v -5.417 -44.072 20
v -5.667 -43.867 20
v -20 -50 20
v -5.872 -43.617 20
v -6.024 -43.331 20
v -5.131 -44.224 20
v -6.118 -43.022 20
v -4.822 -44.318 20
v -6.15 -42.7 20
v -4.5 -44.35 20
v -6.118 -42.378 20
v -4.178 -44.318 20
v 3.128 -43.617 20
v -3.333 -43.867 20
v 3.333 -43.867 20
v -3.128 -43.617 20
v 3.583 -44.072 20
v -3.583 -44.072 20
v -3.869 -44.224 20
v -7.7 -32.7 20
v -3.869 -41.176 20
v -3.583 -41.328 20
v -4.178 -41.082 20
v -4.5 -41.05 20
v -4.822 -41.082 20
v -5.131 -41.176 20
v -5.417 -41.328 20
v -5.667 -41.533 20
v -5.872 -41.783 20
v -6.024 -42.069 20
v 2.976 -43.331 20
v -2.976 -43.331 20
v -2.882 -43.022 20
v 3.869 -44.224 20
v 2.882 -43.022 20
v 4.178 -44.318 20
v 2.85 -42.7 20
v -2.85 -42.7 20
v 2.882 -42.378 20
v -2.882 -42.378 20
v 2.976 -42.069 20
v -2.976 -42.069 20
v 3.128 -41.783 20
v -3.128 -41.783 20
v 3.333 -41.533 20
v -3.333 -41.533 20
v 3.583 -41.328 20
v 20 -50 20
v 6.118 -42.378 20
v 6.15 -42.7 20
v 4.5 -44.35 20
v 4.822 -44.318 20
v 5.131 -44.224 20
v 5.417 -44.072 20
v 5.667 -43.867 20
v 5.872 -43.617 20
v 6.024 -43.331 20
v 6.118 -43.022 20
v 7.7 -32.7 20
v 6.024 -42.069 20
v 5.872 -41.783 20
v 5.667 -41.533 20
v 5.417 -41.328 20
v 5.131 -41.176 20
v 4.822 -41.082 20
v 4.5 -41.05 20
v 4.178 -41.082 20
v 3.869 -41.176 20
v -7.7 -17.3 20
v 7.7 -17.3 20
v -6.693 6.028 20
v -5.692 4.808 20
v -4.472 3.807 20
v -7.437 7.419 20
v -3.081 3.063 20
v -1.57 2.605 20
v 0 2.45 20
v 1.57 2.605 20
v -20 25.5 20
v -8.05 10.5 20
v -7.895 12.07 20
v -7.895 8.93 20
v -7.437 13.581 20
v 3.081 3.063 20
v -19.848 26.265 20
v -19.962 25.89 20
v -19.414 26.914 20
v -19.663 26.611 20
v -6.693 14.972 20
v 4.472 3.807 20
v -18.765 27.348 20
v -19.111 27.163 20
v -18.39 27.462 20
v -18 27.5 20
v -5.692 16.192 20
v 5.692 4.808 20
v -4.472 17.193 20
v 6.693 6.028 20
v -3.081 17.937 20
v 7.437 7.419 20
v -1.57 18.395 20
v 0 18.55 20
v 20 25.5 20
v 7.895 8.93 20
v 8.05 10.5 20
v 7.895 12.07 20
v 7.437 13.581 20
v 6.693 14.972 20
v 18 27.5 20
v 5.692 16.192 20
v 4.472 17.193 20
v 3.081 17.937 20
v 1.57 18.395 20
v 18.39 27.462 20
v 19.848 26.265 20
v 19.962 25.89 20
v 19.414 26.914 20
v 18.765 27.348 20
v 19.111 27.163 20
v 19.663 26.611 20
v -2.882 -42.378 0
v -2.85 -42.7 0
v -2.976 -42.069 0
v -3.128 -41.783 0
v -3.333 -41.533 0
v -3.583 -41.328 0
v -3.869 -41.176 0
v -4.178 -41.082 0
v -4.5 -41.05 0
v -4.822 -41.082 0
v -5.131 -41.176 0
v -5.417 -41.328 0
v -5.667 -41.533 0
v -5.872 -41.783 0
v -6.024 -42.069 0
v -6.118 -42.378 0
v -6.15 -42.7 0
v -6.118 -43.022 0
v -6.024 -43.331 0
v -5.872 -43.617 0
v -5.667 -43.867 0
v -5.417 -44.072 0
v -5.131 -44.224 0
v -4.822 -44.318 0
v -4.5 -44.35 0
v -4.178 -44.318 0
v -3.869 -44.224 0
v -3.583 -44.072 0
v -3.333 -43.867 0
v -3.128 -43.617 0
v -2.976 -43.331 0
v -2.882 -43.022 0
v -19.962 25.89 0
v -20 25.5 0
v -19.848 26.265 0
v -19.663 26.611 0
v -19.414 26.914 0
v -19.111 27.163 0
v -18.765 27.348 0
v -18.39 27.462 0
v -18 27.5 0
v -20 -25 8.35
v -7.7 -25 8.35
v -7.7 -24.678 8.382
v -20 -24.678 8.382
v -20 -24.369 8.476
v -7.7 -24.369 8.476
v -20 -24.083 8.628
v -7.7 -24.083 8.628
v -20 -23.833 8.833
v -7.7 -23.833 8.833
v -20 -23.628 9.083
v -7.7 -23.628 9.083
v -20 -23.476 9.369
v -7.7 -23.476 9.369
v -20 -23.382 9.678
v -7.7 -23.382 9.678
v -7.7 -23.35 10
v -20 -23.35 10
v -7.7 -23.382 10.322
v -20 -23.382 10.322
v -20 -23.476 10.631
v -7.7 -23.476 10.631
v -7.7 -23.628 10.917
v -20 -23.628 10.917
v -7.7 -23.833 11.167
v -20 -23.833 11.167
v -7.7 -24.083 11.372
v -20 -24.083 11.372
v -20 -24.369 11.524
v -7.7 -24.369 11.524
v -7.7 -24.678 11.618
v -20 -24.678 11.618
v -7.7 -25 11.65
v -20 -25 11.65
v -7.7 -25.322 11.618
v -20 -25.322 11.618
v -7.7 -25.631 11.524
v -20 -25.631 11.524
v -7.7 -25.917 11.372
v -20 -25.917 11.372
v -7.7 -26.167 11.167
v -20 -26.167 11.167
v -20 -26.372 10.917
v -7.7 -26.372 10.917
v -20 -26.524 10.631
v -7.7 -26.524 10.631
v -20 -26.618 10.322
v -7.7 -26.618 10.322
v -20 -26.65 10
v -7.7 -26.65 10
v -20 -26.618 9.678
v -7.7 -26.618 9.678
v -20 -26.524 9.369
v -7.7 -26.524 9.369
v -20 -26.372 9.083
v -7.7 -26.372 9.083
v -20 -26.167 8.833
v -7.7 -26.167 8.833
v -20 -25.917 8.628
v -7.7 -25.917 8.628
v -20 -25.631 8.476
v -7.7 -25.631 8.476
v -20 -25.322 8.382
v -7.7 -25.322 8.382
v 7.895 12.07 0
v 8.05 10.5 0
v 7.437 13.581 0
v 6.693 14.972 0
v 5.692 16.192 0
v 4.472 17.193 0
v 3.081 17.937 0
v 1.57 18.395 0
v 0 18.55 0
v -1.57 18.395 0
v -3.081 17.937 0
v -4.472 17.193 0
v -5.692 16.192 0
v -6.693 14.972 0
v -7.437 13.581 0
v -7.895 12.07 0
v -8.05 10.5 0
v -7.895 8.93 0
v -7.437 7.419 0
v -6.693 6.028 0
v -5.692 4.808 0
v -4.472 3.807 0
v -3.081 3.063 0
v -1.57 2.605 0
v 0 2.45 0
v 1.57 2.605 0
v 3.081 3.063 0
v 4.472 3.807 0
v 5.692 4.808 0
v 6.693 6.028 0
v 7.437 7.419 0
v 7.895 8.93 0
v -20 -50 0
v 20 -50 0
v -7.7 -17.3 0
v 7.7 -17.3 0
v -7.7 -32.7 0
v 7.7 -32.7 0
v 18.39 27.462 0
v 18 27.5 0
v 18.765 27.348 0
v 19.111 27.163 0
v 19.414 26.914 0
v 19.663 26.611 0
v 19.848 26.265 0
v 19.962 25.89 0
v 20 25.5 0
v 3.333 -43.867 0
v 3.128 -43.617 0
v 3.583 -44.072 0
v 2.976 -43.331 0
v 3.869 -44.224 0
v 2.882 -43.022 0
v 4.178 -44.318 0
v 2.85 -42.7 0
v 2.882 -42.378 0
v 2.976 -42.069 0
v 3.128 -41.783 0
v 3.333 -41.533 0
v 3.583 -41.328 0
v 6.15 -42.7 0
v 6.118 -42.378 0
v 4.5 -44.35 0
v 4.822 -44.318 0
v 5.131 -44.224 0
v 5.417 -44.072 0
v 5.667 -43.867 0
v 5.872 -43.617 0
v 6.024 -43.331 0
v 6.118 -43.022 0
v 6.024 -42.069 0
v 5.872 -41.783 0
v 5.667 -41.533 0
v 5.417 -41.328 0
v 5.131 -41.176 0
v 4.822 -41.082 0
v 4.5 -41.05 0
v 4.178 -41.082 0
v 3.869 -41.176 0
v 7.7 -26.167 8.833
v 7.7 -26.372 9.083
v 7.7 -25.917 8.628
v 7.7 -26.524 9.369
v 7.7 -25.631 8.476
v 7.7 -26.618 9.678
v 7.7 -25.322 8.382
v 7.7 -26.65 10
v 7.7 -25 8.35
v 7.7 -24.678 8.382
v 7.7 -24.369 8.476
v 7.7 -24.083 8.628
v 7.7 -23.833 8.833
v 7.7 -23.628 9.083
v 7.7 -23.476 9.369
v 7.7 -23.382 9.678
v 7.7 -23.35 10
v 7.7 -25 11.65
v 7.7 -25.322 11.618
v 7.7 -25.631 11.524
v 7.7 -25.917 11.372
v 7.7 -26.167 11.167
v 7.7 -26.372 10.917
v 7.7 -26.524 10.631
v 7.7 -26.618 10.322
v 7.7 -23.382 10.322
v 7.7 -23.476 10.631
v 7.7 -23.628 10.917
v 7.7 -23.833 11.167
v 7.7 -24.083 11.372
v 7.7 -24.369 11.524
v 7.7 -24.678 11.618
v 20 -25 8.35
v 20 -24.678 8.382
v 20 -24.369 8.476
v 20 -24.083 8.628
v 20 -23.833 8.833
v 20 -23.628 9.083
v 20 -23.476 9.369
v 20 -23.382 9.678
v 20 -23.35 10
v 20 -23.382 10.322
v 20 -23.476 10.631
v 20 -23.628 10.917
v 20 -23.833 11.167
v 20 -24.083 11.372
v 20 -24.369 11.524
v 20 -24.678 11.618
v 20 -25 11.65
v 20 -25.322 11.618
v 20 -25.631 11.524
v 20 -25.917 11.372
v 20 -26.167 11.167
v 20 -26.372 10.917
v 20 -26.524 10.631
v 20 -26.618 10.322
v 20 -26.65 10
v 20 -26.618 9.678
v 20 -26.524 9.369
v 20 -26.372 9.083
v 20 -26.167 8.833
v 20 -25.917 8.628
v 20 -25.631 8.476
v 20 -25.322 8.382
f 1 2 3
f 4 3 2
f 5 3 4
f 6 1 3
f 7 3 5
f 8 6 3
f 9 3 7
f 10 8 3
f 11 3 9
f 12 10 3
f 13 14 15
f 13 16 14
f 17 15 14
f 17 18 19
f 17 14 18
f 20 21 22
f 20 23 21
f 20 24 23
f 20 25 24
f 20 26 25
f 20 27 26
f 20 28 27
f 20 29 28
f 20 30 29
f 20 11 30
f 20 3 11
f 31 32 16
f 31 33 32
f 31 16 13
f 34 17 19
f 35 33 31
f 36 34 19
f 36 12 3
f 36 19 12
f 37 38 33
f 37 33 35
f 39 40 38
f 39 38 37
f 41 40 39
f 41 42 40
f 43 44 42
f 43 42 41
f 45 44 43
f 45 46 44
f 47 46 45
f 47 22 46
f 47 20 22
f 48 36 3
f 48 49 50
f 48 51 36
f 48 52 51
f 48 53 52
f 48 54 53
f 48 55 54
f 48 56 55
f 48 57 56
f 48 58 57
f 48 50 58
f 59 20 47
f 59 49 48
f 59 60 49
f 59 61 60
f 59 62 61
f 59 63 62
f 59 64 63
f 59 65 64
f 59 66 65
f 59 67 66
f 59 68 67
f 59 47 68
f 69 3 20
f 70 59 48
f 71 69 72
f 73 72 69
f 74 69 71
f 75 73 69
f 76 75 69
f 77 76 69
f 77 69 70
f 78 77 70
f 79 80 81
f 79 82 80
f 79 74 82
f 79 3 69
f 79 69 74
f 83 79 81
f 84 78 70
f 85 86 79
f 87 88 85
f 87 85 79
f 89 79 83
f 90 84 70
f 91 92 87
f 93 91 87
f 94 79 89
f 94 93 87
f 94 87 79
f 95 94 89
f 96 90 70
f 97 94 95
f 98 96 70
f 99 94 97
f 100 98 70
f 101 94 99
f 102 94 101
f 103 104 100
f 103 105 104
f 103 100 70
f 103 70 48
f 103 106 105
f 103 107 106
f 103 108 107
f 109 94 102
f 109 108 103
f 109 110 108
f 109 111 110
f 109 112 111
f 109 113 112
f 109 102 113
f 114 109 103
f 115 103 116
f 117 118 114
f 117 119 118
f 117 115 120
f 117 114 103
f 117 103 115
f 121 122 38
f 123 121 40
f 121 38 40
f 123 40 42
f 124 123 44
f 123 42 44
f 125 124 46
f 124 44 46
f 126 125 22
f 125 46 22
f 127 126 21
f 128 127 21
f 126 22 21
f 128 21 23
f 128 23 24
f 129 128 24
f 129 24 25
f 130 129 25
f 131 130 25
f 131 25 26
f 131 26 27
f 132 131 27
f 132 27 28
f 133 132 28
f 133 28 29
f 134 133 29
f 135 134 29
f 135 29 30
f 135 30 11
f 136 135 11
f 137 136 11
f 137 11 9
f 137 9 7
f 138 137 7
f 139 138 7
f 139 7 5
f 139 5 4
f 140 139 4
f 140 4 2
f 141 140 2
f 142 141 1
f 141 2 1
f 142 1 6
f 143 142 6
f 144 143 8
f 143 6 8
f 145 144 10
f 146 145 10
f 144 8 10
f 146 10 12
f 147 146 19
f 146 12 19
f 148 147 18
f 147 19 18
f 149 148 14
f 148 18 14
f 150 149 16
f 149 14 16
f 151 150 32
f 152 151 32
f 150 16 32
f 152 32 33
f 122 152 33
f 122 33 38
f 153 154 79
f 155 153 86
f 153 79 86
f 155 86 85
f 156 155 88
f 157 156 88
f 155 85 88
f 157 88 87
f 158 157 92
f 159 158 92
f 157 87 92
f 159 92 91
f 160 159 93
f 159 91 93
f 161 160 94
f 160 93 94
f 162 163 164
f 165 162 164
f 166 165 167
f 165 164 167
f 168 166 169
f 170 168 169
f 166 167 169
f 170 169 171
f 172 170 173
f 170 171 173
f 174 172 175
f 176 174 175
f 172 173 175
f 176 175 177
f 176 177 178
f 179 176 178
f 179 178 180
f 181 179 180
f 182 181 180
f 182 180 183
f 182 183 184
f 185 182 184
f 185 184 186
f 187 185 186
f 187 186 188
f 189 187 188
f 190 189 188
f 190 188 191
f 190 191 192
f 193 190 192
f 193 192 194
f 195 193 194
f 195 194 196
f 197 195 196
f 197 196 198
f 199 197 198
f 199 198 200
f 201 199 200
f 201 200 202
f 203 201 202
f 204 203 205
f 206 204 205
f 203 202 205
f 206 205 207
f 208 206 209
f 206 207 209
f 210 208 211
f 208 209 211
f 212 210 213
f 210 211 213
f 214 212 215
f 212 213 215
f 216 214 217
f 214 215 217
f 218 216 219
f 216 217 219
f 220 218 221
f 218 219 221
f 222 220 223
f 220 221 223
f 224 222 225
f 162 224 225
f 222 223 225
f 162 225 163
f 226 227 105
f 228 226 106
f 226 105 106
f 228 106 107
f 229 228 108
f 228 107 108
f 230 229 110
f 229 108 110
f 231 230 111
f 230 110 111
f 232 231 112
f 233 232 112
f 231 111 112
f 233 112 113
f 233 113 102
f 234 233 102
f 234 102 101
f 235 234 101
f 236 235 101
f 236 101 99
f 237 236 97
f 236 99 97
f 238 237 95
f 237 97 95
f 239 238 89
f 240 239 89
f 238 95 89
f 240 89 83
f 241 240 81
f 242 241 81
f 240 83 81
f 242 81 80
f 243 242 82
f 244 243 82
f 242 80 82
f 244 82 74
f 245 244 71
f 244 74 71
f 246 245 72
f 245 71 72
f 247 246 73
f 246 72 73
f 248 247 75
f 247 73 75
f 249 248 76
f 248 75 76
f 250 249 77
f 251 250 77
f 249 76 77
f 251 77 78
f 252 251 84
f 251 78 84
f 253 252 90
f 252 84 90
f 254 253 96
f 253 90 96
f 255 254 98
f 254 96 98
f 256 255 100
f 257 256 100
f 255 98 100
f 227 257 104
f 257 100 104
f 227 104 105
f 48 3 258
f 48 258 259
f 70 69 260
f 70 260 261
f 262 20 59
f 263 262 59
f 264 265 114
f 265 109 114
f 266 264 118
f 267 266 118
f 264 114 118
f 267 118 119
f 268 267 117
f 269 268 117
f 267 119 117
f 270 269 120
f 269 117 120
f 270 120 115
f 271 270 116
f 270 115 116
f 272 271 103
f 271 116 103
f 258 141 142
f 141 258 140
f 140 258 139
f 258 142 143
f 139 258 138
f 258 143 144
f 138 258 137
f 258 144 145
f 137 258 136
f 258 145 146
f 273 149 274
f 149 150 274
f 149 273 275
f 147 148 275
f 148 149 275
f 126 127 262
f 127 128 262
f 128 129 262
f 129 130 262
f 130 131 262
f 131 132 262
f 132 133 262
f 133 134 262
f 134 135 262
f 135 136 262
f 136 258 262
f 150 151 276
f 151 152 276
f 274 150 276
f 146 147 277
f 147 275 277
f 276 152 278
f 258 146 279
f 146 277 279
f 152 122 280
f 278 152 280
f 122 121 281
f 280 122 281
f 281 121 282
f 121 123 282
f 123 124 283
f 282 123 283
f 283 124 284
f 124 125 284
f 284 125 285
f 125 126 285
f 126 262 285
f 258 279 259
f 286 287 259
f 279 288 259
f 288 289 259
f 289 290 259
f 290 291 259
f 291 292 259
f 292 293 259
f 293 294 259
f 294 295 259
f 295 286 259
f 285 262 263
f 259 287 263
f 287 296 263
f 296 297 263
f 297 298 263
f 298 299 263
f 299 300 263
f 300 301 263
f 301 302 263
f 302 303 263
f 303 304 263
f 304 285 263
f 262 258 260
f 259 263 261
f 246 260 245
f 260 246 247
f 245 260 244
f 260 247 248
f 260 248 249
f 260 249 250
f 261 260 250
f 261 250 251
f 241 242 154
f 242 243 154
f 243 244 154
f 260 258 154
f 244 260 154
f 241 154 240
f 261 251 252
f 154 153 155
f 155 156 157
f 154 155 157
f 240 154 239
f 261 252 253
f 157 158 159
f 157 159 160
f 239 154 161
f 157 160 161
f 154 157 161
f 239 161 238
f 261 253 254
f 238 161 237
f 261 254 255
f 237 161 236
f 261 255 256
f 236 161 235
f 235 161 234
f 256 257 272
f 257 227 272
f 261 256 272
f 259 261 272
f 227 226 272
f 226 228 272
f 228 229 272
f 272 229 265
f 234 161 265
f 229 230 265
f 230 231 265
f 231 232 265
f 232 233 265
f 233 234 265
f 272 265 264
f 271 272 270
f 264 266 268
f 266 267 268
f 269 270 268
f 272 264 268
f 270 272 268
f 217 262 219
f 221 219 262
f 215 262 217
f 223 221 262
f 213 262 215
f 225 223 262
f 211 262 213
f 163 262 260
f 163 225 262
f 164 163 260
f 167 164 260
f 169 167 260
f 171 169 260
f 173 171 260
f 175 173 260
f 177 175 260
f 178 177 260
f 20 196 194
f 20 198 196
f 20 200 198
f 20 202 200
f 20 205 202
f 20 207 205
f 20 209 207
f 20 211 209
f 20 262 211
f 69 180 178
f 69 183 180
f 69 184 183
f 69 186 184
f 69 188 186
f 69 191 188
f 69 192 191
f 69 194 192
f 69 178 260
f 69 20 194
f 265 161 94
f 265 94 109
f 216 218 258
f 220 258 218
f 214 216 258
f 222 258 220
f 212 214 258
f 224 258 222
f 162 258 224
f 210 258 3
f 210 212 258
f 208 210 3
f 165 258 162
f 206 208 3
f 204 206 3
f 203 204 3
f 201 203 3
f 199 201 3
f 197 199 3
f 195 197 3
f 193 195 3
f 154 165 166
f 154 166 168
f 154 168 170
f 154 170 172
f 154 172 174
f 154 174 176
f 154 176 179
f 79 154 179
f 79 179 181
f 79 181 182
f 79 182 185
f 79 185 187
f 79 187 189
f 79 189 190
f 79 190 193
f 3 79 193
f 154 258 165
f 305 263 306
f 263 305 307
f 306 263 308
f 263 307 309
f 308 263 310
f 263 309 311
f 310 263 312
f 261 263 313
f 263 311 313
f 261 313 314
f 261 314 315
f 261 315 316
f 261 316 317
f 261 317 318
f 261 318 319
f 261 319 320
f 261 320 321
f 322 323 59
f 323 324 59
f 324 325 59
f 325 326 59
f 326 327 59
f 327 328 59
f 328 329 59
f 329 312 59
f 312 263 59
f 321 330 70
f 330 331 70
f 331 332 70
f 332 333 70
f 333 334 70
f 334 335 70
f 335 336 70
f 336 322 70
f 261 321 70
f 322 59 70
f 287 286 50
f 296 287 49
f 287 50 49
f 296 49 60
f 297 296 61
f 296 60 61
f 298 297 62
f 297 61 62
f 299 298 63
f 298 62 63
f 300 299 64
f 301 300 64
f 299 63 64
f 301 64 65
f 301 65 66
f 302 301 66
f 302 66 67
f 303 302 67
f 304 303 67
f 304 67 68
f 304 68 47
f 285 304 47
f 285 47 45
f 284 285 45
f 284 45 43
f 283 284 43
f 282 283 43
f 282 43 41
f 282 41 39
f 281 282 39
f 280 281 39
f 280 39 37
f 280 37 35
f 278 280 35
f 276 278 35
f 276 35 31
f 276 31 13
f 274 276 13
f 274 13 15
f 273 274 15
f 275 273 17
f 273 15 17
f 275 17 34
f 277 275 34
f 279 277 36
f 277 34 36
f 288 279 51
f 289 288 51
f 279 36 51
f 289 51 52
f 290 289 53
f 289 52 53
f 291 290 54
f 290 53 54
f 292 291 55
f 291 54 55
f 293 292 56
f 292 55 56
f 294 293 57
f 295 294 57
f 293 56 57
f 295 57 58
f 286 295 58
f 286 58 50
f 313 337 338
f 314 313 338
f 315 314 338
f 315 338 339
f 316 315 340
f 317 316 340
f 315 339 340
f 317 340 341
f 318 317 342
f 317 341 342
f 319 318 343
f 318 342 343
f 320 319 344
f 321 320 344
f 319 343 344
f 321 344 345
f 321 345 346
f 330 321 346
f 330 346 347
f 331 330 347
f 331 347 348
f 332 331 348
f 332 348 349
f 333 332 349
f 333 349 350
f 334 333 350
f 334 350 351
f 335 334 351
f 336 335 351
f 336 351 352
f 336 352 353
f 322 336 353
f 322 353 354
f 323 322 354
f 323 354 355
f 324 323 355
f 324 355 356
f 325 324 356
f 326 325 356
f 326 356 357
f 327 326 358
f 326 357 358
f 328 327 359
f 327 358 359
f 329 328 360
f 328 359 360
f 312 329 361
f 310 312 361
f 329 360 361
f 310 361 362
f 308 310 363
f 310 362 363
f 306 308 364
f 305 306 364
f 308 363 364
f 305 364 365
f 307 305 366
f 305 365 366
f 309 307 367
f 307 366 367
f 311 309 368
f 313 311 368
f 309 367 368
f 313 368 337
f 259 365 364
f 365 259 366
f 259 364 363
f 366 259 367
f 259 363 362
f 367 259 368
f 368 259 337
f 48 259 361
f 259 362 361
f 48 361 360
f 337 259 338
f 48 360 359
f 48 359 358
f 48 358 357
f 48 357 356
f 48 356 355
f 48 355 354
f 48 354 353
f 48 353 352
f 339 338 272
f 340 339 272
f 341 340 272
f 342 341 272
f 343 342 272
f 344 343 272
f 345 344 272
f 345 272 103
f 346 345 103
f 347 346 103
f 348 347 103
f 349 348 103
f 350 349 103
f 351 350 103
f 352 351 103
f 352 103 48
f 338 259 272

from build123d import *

# Parameters (mm, degrees)
SKETCH_1_W          = 40
SKETCH_1_H          = 55
EXTRUDE_1_DEPTH     = 20
SKETCH_2_R          = 8.05
CUT_EXTRUDE_1_DEPTH = 20
SKETCH_3_W          = 40
SKETCH_3_H          = 20
EXTRUDE_2_DEPTH     = 32.5
SKETCH_6_W          = 15.4
SKETCH_6_H          = 15.4
CUT_EXTRUDE_4_DEPTH = 1000
SKETCH_4_R          = 1.65
CUT_EXTRUDE_2_DEPTH = 40
SKETCH_5_W          = 5
SKETCH_5_H          = 5
CUT_EXTRUDE_3_DEPTH = 6
FILLET_1_R          = 2
SKETCH_7_W          = 47.564048478
SKETCH_7_H          = 11.463166905
CUT_EXTRUDE_5_DEPTH = 100
SKETCH_8_R          = 1.65
CUT_EXTRUDE_6_DEPTH = 1000


with BuildPart() as part:
    # 草图1 → 凸台-拉伸1 (new body)
    with BuildSketch(Plane.XY):
        Rectangle(SKETCH_1_W, SKETCH_1_H)
    extrude(amount=EXTRUDE_1_DEPTH)

    # 草图2 → 切除-拉伸1 (cut)
    with BuildSketch(Plane.XY.offset(20)):
        with Locations((0, 10.5)):
            Circle(SKETCH_2_R)
    extrude(amount=-CUT_EXTRUDE_1_DEPTH, mode=Mode.SUBTRACT)

    # 草图3 → 凸台-拉伸2 (add)
    with BuildSketch(Plane.XZ.offset(27.5)):
        with Locations((0, 10)):
            Rectangle(SKETCH_3_W, SKETCH_3_H)
    extrude(amount=EXTRUDE_2_DEPTH)

    # 草图6 → 切除-拉伸4 (cut)
    with BuildSketch(Plane.XY.offset(20)):
        with Locations((0, -25)):
            Rectangle(SKETCH_6_W, SKETCH_6_H)
    extrude(amount=-CUT_EXTRUDE_4_DEPTH, mode=Mode.SUBTRACT)

    # 草图4 → 切除-拉伸2 (cut)
    with BuildSketch(Plane.XY.offset(20)):
        with Locations((4.5, -42.7)):
            Circle(SKETCH_4_R)
        with Locations((-4.5, -42.7)):
            Circle(SKETCH_4_R)
    extrude(amount=-CUT_EXTRUDE_2_DEPTH, mode=Mode.SUBTRACT)

    # 草图5 → 切除-拉伸3 (cut)
    with BuildSketch(Plane.XZ.offset(60)):
        with Locations((0, 12)):
            Rectangle(SKETCH_5_W, SKETCH_5_H)
    extrude(amount=-CUT_EXTRUDE_3_DEPTH, mode=Mode.SUBTRACT)

    # 圆角1
    fillet_1_edges = [part.edges().sort_by_distance(p)[0] for p in [
        (-20, 27.5, 10),
        (20, 27.5, 10),
    ]]
    fillet(fillet_1_edges, radius=FILLET_1_R)

    # 草图7 → 切除-拉伸5 (cut)
    with BuildSketch(Plane.XY.offset(20)):
        with Locations((0, -55.731583453)):
            Rectangle(SKETCH_7_W, SKETCH_7_H)
    extrude(amount=-CUT_EXTRUDE_5_DEPTH, mode=Mode.SUBTRACT)

    # 草图8 → 切除-拉伸6 (cut)
    with BuildSketch(Plane(origin=(20, 0, 0), x_dir=(0, 0, -1), z_dir=(1, 0, 0))):
        with Locations((-10, -25)):
            Circle(SKETCH_8_R)
    extrude(amount=-CUT_EXTRUDE_6_DEPTH, mode=Mode.SUBTRACT)


solid = part.part
